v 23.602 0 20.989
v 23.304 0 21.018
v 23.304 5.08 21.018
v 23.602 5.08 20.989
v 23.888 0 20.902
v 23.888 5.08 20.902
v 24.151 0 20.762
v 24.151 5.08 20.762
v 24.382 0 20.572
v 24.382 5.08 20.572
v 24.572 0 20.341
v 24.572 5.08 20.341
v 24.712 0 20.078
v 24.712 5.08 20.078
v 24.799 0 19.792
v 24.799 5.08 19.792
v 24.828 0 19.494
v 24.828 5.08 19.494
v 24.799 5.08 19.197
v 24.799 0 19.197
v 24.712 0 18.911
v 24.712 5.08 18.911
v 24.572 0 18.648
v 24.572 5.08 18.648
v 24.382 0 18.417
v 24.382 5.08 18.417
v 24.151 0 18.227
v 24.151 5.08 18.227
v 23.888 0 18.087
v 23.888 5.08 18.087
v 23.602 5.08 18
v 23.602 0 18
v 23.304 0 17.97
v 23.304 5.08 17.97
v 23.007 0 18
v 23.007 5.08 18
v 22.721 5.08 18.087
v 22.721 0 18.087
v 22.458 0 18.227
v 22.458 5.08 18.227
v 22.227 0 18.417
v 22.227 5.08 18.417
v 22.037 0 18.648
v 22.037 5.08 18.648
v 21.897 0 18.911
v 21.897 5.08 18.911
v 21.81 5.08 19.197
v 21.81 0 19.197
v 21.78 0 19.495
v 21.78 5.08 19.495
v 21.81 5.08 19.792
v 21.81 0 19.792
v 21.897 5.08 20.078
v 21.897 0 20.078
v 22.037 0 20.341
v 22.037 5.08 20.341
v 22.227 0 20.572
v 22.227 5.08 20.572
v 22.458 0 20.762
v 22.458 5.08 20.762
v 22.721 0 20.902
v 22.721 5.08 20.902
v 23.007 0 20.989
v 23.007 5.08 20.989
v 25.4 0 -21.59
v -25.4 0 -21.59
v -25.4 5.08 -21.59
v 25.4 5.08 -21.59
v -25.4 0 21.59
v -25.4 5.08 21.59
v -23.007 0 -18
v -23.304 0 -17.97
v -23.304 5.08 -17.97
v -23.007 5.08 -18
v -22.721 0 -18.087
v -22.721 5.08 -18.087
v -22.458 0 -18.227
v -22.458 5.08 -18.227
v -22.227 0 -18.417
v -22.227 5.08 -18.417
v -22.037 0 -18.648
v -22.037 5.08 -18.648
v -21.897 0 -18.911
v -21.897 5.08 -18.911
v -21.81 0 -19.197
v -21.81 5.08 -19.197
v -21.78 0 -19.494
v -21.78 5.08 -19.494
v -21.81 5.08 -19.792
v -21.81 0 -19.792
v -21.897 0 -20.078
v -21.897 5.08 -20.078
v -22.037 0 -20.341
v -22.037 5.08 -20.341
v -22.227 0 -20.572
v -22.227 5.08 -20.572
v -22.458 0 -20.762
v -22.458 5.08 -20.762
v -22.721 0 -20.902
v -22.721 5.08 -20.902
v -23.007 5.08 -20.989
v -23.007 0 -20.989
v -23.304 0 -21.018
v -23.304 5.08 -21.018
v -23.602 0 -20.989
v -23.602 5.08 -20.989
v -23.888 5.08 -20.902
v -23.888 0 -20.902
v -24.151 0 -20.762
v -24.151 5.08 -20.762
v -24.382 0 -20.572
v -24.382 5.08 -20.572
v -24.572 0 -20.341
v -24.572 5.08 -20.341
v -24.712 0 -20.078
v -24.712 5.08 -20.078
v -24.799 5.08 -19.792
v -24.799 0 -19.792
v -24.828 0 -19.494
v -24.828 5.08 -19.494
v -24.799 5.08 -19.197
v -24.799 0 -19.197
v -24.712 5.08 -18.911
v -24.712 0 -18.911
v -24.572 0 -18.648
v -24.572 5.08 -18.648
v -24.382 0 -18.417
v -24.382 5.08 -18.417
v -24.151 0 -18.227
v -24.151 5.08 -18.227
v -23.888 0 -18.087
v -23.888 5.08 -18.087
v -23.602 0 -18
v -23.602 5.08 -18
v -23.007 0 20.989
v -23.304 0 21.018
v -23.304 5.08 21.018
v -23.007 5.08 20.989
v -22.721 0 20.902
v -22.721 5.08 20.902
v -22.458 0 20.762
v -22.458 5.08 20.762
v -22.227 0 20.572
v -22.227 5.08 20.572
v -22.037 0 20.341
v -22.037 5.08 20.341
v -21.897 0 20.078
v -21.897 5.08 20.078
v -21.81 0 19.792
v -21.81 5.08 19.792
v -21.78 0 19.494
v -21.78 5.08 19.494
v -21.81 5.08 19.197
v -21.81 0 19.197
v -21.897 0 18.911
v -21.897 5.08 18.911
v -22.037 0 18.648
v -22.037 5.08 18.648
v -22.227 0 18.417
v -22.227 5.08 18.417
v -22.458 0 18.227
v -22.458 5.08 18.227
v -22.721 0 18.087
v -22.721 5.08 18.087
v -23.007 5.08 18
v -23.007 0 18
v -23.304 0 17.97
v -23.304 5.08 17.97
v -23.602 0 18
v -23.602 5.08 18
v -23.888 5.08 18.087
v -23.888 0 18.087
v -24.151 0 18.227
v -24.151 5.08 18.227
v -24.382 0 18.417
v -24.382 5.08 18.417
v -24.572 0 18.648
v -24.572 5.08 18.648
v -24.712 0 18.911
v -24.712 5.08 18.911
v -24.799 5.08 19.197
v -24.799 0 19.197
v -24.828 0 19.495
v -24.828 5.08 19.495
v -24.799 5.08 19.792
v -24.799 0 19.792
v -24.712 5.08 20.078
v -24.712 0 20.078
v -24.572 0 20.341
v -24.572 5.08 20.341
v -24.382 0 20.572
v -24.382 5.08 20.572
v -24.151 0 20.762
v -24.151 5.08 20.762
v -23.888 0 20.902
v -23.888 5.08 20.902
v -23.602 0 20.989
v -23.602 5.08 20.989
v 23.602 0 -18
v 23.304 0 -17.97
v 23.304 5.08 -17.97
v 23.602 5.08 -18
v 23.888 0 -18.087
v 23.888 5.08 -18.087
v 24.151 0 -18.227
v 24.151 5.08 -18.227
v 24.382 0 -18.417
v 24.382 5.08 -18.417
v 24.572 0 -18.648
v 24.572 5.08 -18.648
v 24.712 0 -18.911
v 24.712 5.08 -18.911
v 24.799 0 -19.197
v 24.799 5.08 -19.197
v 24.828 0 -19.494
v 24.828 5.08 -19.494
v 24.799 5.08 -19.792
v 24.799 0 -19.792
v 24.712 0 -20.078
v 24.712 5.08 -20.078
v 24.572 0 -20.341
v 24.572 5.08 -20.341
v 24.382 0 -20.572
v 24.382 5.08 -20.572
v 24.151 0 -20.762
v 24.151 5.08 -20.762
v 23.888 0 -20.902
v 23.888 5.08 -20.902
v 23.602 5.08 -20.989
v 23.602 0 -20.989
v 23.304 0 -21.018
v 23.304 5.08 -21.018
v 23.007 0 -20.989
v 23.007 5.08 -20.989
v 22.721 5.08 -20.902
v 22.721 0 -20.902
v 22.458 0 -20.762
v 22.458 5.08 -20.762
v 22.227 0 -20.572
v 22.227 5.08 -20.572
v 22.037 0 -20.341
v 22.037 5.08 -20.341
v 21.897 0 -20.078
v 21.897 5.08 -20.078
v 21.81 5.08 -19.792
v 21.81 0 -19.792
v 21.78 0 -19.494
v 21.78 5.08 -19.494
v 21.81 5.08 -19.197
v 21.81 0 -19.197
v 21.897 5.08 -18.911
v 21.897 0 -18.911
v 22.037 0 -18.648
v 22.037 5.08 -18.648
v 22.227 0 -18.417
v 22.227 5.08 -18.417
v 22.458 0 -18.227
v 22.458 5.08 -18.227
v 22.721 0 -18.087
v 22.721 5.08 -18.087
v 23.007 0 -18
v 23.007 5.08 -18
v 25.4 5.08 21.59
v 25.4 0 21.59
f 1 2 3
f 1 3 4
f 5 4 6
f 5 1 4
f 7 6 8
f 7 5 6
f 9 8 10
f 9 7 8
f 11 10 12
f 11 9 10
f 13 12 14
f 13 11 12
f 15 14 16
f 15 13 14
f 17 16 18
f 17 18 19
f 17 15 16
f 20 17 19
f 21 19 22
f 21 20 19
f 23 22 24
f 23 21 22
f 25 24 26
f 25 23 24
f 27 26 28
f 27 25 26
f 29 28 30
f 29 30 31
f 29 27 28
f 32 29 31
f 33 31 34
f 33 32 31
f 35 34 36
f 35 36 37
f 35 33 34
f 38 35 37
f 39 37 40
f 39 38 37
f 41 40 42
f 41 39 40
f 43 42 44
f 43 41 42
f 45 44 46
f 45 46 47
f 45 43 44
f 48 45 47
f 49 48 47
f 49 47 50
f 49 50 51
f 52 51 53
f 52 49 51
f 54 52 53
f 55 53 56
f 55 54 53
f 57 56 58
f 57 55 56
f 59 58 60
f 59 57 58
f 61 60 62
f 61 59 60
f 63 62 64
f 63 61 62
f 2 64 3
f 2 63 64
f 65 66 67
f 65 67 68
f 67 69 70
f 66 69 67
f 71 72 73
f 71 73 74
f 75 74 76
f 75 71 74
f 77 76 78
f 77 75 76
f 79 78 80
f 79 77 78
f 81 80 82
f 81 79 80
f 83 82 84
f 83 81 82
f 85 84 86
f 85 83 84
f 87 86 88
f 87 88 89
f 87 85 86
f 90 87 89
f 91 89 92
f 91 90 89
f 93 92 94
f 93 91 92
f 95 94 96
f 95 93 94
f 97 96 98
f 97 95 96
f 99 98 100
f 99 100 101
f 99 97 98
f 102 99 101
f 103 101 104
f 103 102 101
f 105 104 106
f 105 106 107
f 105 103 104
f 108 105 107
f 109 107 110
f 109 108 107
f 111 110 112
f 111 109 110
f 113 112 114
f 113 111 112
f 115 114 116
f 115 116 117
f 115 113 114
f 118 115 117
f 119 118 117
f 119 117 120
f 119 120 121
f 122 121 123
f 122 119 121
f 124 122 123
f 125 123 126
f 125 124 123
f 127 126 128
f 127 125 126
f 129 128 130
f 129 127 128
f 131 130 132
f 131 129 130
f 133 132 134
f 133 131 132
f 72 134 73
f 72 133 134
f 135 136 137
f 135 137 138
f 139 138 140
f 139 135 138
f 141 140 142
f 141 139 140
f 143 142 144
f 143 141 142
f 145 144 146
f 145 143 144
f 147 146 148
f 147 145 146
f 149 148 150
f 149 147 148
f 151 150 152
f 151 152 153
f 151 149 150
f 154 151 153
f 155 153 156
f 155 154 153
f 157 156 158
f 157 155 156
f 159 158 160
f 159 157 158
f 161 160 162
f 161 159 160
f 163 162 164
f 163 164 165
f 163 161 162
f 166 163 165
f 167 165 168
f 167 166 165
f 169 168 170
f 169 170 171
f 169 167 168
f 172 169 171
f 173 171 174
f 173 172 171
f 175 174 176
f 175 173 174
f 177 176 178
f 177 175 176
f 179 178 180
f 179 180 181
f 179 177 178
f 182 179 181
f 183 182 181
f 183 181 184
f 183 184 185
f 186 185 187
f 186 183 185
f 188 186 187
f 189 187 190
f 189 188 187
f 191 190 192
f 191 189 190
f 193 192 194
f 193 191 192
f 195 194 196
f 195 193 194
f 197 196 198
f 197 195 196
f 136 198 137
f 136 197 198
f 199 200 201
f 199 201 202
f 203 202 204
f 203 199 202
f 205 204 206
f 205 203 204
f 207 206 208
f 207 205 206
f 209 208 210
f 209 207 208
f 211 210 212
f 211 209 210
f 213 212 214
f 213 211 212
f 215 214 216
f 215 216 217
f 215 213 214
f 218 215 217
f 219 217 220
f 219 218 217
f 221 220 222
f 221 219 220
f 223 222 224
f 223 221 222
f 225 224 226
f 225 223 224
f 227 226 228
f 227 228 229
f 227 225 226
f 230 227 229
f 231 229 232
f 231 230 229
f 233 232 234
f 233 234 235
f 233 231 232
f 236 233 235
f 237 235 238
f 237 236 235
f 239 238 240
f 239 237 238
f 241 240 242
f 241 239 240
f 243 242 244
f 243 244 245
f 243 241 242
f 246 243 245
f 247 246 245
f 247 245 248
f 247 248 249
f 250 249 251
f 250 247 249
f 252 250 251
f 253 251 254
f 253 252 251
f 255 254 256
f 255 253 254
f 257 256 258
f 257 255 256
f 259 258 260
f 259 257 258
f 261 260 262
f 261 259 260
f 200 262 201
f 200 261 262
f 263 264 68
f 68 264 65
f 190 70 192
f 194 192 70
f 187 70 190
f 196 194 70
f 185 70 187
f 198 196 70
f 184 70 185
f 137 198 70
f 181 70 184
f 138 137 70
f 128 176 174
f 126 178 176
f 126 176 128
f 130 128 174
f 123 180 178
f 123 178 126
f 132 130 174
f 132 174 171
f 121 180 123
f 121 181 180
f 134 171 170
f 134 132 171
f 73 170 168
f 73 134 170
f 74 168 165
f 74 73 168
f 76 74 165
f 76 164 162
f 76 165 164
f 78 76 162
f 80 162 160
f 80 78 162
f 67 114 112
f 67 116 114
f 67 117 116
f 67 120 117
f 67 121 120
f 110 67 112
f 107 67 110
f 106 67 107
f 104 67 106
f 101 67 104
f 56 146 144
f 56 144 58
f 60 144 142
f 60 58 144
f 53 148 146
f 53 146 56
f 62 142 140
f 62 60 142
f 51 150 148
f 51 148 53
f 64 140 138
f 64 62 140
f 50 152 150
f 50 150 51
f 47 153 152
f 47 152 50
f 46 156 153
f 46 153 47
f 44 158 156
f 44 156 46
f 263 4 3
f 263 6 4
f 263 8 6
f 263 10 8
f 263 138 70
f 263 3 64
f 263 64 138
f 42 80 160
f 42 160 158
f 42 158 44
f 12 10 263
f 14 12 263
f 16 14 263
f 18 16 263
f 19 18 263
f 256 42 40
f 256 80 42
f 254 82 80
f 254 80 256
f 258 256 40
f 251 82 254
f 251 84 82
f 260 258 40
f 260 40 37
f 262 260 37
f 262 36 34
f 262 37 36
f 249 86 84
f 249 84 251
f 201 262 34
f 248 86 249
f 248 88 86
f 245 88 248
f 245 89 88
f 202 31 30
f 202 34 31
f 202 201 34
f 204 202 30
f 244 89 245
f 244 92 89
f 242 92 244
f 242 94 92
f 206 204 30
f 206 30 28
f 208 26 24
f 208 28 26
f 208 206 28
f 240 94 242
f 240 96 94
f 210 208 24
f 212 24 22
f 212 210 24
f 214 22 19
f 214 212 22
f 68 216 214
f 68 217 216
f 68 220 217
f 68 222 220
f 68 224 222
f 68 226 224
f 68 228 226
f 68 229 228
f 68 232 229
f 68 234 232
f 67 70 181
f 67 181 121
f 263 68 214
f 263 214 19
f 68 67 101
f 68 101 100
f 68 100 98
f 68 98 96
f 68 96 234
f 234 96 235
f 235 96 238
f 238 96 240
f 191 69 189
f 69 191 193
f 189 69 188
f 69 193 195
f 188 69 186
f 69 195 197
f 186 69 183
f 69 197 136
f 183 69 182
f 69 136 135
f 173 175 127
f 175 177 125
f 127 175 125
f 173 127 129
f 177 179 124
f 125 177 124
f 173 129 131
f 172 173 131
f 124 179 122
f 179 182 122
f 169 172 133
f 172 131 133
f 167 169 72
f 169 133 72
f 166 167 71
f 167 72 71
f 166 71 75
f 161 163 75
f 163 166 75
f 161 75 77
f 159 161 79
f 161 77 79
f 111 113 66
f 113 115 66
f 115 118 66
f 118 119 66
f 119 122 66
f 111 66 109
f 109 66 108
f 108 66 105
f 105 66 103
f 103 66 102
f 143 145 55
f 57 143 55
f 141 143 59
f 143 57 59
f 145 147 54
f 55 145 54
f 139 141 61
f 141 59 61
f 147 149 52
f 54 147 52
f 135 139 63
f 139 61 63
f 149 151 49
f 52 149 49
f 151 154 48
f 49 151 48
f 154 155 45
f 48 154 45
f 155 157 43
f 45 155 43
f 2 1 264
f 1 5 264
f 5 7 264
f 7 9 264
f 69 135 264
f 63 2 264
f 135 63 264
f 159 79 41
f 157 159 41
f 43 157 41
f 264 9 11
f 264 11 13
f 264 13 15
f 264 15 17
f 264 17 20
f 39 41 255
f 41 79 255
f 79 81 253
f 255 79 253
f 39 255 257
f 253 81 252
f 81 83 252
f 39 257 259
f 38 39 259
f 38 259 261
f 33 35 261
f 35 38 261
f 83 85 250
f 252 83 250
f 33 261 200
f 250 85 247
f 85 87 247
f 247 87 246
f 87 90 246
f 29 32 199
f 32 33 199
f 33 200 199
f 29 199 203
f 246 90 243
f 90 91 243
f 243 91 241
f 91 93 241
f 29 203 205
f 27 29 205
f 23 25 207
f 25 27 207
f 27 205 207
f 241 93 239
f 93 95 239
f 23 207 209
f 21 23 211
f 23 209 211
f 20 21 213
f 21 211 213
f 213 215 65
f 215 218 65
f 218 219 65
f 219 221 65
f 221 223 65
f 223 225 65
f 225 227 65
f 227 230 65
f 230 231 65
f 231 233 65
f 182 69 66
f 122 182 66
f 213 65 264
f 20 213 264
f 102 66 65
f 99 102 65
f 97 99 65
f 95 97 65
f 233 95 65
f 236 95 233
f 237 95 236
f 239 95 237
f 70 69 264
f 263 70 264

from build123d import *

# Parameters (mm, degrees)
SKETCH1_W           = 50.8
SKETCH1_H           = 43.18
SKETCH1_R           = 1.524
BOSS_EXTRUDE1_DEPTH = 5.08


with BuildPart() as part:
    # Sketch1 → Boss-Extrude1 (new body)
    with BuildSketch(Plane(origin=(0, 0, 0), x_dir=(1, 0, 0), z_dir=(0, 1, 0))):
        Rectangle(SKETCH1_W, SKETCH1_H)
        with Locations(Location((-23.3045, 19.4945, 0), (0, 0, 270))):  # turned: the seam where the file's is
            Circle(SKETCH1_R, mode=Mode.SUBTRACT)
        with Locations(Location((23.3045, 19.4945, 0), (0, 0, 270))):  # turned: the seam where the file's is
            Circle(SKETCH1_R, mode=Mode.SUBTRACT)
        with Locations(Location((-23.3045, -19.4945, 0), (0, 0, 270))):  # turned: the seam where the file's is
            Circle(SKETCH1_R, mode=Mode.SUBTRACT)
        with Locations(Location((23.3045, -19.4945, 0), (0, 0, 270))):  # turned: the seam where the file's is
            Circle(SKETCH1_R, mode=Mode.SUBTRACT)
    extrude(amount=BOSS_EXTRUDE1_DEPTH)


solid = part.part
